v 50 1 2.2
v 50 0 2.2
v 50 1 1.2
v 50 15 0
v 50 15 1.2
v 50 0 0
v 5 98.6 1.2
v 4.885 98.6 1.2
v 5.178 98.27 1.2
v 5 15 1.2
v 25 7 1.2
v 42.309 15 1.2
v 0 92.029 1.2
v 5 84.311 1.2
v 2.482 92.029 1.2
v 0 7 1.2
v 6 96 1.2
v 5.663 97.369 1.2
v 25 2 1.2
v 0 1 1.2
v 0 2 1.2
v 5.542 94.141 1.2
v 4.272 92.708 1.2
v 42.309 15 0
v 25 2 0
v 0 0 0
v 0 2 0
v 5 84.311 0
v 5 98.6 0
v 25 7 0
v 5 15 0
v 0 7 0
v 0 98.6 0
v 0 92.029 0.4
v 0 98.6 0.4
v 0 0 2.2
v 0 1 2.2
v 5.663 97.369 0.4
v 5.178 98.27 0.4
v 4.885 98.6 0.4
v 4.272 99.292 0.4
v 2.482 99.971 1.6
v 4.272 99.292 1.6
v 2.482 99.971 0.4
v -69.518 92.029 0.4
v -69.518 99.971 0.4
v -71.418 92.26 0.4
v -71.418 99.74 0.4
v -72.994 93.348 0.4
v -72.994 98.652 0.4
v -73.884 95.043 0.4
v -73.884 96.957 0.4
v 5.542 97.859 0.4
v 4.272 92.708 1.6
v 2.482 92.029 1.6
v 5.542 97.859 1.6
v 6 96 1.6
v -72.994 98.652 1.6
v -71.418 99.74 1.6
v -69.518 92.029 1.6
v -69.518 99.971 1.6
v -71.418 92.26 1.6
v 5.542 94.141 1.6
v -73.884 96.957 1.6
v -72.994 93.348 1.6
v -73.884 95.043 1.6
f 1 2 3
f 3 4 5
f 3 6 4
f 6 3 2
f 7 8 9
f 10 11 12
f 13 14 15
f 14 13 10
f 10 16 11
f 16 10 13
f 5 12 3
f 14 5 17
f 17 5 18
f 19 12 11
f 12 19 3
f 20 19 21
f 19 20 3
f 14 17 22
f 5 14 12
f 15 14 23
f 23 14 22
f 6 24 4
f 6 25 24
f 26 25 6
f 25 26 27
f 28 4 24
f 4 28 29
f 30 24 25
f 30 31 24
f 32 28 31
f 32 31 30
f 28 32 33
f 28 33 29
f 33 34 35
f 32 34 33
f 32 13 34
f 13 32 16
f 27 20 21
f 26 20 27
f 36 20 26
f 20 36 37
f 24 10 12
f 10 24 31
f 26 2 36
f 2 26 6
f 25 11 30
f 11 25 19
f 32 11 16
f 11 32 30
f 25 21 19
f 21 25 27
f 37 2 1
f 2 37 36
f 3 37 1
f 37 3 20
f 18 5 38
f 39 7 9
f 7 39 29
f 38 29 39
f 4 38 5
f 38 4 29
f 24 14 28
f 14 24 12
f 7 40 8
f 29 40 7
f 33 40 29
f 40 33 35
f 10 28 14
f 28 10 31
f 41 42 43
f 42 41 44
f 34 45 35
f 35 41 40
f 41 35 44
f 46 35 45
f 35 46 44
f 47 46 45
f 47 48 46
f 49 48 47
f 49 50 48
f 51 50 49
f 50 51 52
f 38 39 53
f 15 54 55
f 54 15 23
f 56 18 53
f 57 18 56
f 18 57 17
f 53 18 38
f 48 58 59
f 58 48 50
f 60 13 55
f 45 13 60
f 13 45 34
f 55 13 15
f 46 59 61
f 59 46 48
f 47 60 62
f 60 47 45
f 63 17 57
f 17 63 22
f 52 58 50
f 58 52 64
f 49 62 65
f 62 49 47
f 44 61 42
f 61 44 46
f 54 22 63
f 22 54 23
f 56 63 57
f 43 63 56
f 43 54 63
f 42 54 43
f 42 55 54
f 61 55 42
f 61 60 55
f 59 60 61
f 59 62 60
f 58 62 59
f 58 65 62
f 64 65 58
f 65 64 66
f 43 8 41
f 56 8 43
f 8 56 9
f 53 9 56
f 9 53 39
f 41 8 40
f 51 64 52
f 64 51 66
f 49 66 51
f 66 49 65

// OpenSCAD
thickness = 1.2;
cube([50, 1, 1 + thickness]);
translate([0, 0, 0]) {
  difference() {
    cube([50, 15, thickness]);
    translate([0, 2, 0]) {
      cube([25, 5, 5]);
    };
  }
}
hull() {
  translate([50 - 5, 15 - 5, 0]) {
    cube([5, 5, thickness]);
  };
  translate([0, 98.6 - 5, 0]) {
    cube([5, 5, thickness]);
  };
}
hull() {
  translate([0, 15, 0]) {
    cube([5, 5, thickness]);
  };
  translate([0, 95 - 5, 0]) {
    cube([5, 5, thickness]);
  };
}
hull() {
  translate([2, 100 - 4, 1]) {
    cylinder(h = thickness, r = 4, center = true);
  };
  translate([-70, 100 - 4, 1]) {
    cylinder(h = thickness, r = 4, center = true);
  };
}
